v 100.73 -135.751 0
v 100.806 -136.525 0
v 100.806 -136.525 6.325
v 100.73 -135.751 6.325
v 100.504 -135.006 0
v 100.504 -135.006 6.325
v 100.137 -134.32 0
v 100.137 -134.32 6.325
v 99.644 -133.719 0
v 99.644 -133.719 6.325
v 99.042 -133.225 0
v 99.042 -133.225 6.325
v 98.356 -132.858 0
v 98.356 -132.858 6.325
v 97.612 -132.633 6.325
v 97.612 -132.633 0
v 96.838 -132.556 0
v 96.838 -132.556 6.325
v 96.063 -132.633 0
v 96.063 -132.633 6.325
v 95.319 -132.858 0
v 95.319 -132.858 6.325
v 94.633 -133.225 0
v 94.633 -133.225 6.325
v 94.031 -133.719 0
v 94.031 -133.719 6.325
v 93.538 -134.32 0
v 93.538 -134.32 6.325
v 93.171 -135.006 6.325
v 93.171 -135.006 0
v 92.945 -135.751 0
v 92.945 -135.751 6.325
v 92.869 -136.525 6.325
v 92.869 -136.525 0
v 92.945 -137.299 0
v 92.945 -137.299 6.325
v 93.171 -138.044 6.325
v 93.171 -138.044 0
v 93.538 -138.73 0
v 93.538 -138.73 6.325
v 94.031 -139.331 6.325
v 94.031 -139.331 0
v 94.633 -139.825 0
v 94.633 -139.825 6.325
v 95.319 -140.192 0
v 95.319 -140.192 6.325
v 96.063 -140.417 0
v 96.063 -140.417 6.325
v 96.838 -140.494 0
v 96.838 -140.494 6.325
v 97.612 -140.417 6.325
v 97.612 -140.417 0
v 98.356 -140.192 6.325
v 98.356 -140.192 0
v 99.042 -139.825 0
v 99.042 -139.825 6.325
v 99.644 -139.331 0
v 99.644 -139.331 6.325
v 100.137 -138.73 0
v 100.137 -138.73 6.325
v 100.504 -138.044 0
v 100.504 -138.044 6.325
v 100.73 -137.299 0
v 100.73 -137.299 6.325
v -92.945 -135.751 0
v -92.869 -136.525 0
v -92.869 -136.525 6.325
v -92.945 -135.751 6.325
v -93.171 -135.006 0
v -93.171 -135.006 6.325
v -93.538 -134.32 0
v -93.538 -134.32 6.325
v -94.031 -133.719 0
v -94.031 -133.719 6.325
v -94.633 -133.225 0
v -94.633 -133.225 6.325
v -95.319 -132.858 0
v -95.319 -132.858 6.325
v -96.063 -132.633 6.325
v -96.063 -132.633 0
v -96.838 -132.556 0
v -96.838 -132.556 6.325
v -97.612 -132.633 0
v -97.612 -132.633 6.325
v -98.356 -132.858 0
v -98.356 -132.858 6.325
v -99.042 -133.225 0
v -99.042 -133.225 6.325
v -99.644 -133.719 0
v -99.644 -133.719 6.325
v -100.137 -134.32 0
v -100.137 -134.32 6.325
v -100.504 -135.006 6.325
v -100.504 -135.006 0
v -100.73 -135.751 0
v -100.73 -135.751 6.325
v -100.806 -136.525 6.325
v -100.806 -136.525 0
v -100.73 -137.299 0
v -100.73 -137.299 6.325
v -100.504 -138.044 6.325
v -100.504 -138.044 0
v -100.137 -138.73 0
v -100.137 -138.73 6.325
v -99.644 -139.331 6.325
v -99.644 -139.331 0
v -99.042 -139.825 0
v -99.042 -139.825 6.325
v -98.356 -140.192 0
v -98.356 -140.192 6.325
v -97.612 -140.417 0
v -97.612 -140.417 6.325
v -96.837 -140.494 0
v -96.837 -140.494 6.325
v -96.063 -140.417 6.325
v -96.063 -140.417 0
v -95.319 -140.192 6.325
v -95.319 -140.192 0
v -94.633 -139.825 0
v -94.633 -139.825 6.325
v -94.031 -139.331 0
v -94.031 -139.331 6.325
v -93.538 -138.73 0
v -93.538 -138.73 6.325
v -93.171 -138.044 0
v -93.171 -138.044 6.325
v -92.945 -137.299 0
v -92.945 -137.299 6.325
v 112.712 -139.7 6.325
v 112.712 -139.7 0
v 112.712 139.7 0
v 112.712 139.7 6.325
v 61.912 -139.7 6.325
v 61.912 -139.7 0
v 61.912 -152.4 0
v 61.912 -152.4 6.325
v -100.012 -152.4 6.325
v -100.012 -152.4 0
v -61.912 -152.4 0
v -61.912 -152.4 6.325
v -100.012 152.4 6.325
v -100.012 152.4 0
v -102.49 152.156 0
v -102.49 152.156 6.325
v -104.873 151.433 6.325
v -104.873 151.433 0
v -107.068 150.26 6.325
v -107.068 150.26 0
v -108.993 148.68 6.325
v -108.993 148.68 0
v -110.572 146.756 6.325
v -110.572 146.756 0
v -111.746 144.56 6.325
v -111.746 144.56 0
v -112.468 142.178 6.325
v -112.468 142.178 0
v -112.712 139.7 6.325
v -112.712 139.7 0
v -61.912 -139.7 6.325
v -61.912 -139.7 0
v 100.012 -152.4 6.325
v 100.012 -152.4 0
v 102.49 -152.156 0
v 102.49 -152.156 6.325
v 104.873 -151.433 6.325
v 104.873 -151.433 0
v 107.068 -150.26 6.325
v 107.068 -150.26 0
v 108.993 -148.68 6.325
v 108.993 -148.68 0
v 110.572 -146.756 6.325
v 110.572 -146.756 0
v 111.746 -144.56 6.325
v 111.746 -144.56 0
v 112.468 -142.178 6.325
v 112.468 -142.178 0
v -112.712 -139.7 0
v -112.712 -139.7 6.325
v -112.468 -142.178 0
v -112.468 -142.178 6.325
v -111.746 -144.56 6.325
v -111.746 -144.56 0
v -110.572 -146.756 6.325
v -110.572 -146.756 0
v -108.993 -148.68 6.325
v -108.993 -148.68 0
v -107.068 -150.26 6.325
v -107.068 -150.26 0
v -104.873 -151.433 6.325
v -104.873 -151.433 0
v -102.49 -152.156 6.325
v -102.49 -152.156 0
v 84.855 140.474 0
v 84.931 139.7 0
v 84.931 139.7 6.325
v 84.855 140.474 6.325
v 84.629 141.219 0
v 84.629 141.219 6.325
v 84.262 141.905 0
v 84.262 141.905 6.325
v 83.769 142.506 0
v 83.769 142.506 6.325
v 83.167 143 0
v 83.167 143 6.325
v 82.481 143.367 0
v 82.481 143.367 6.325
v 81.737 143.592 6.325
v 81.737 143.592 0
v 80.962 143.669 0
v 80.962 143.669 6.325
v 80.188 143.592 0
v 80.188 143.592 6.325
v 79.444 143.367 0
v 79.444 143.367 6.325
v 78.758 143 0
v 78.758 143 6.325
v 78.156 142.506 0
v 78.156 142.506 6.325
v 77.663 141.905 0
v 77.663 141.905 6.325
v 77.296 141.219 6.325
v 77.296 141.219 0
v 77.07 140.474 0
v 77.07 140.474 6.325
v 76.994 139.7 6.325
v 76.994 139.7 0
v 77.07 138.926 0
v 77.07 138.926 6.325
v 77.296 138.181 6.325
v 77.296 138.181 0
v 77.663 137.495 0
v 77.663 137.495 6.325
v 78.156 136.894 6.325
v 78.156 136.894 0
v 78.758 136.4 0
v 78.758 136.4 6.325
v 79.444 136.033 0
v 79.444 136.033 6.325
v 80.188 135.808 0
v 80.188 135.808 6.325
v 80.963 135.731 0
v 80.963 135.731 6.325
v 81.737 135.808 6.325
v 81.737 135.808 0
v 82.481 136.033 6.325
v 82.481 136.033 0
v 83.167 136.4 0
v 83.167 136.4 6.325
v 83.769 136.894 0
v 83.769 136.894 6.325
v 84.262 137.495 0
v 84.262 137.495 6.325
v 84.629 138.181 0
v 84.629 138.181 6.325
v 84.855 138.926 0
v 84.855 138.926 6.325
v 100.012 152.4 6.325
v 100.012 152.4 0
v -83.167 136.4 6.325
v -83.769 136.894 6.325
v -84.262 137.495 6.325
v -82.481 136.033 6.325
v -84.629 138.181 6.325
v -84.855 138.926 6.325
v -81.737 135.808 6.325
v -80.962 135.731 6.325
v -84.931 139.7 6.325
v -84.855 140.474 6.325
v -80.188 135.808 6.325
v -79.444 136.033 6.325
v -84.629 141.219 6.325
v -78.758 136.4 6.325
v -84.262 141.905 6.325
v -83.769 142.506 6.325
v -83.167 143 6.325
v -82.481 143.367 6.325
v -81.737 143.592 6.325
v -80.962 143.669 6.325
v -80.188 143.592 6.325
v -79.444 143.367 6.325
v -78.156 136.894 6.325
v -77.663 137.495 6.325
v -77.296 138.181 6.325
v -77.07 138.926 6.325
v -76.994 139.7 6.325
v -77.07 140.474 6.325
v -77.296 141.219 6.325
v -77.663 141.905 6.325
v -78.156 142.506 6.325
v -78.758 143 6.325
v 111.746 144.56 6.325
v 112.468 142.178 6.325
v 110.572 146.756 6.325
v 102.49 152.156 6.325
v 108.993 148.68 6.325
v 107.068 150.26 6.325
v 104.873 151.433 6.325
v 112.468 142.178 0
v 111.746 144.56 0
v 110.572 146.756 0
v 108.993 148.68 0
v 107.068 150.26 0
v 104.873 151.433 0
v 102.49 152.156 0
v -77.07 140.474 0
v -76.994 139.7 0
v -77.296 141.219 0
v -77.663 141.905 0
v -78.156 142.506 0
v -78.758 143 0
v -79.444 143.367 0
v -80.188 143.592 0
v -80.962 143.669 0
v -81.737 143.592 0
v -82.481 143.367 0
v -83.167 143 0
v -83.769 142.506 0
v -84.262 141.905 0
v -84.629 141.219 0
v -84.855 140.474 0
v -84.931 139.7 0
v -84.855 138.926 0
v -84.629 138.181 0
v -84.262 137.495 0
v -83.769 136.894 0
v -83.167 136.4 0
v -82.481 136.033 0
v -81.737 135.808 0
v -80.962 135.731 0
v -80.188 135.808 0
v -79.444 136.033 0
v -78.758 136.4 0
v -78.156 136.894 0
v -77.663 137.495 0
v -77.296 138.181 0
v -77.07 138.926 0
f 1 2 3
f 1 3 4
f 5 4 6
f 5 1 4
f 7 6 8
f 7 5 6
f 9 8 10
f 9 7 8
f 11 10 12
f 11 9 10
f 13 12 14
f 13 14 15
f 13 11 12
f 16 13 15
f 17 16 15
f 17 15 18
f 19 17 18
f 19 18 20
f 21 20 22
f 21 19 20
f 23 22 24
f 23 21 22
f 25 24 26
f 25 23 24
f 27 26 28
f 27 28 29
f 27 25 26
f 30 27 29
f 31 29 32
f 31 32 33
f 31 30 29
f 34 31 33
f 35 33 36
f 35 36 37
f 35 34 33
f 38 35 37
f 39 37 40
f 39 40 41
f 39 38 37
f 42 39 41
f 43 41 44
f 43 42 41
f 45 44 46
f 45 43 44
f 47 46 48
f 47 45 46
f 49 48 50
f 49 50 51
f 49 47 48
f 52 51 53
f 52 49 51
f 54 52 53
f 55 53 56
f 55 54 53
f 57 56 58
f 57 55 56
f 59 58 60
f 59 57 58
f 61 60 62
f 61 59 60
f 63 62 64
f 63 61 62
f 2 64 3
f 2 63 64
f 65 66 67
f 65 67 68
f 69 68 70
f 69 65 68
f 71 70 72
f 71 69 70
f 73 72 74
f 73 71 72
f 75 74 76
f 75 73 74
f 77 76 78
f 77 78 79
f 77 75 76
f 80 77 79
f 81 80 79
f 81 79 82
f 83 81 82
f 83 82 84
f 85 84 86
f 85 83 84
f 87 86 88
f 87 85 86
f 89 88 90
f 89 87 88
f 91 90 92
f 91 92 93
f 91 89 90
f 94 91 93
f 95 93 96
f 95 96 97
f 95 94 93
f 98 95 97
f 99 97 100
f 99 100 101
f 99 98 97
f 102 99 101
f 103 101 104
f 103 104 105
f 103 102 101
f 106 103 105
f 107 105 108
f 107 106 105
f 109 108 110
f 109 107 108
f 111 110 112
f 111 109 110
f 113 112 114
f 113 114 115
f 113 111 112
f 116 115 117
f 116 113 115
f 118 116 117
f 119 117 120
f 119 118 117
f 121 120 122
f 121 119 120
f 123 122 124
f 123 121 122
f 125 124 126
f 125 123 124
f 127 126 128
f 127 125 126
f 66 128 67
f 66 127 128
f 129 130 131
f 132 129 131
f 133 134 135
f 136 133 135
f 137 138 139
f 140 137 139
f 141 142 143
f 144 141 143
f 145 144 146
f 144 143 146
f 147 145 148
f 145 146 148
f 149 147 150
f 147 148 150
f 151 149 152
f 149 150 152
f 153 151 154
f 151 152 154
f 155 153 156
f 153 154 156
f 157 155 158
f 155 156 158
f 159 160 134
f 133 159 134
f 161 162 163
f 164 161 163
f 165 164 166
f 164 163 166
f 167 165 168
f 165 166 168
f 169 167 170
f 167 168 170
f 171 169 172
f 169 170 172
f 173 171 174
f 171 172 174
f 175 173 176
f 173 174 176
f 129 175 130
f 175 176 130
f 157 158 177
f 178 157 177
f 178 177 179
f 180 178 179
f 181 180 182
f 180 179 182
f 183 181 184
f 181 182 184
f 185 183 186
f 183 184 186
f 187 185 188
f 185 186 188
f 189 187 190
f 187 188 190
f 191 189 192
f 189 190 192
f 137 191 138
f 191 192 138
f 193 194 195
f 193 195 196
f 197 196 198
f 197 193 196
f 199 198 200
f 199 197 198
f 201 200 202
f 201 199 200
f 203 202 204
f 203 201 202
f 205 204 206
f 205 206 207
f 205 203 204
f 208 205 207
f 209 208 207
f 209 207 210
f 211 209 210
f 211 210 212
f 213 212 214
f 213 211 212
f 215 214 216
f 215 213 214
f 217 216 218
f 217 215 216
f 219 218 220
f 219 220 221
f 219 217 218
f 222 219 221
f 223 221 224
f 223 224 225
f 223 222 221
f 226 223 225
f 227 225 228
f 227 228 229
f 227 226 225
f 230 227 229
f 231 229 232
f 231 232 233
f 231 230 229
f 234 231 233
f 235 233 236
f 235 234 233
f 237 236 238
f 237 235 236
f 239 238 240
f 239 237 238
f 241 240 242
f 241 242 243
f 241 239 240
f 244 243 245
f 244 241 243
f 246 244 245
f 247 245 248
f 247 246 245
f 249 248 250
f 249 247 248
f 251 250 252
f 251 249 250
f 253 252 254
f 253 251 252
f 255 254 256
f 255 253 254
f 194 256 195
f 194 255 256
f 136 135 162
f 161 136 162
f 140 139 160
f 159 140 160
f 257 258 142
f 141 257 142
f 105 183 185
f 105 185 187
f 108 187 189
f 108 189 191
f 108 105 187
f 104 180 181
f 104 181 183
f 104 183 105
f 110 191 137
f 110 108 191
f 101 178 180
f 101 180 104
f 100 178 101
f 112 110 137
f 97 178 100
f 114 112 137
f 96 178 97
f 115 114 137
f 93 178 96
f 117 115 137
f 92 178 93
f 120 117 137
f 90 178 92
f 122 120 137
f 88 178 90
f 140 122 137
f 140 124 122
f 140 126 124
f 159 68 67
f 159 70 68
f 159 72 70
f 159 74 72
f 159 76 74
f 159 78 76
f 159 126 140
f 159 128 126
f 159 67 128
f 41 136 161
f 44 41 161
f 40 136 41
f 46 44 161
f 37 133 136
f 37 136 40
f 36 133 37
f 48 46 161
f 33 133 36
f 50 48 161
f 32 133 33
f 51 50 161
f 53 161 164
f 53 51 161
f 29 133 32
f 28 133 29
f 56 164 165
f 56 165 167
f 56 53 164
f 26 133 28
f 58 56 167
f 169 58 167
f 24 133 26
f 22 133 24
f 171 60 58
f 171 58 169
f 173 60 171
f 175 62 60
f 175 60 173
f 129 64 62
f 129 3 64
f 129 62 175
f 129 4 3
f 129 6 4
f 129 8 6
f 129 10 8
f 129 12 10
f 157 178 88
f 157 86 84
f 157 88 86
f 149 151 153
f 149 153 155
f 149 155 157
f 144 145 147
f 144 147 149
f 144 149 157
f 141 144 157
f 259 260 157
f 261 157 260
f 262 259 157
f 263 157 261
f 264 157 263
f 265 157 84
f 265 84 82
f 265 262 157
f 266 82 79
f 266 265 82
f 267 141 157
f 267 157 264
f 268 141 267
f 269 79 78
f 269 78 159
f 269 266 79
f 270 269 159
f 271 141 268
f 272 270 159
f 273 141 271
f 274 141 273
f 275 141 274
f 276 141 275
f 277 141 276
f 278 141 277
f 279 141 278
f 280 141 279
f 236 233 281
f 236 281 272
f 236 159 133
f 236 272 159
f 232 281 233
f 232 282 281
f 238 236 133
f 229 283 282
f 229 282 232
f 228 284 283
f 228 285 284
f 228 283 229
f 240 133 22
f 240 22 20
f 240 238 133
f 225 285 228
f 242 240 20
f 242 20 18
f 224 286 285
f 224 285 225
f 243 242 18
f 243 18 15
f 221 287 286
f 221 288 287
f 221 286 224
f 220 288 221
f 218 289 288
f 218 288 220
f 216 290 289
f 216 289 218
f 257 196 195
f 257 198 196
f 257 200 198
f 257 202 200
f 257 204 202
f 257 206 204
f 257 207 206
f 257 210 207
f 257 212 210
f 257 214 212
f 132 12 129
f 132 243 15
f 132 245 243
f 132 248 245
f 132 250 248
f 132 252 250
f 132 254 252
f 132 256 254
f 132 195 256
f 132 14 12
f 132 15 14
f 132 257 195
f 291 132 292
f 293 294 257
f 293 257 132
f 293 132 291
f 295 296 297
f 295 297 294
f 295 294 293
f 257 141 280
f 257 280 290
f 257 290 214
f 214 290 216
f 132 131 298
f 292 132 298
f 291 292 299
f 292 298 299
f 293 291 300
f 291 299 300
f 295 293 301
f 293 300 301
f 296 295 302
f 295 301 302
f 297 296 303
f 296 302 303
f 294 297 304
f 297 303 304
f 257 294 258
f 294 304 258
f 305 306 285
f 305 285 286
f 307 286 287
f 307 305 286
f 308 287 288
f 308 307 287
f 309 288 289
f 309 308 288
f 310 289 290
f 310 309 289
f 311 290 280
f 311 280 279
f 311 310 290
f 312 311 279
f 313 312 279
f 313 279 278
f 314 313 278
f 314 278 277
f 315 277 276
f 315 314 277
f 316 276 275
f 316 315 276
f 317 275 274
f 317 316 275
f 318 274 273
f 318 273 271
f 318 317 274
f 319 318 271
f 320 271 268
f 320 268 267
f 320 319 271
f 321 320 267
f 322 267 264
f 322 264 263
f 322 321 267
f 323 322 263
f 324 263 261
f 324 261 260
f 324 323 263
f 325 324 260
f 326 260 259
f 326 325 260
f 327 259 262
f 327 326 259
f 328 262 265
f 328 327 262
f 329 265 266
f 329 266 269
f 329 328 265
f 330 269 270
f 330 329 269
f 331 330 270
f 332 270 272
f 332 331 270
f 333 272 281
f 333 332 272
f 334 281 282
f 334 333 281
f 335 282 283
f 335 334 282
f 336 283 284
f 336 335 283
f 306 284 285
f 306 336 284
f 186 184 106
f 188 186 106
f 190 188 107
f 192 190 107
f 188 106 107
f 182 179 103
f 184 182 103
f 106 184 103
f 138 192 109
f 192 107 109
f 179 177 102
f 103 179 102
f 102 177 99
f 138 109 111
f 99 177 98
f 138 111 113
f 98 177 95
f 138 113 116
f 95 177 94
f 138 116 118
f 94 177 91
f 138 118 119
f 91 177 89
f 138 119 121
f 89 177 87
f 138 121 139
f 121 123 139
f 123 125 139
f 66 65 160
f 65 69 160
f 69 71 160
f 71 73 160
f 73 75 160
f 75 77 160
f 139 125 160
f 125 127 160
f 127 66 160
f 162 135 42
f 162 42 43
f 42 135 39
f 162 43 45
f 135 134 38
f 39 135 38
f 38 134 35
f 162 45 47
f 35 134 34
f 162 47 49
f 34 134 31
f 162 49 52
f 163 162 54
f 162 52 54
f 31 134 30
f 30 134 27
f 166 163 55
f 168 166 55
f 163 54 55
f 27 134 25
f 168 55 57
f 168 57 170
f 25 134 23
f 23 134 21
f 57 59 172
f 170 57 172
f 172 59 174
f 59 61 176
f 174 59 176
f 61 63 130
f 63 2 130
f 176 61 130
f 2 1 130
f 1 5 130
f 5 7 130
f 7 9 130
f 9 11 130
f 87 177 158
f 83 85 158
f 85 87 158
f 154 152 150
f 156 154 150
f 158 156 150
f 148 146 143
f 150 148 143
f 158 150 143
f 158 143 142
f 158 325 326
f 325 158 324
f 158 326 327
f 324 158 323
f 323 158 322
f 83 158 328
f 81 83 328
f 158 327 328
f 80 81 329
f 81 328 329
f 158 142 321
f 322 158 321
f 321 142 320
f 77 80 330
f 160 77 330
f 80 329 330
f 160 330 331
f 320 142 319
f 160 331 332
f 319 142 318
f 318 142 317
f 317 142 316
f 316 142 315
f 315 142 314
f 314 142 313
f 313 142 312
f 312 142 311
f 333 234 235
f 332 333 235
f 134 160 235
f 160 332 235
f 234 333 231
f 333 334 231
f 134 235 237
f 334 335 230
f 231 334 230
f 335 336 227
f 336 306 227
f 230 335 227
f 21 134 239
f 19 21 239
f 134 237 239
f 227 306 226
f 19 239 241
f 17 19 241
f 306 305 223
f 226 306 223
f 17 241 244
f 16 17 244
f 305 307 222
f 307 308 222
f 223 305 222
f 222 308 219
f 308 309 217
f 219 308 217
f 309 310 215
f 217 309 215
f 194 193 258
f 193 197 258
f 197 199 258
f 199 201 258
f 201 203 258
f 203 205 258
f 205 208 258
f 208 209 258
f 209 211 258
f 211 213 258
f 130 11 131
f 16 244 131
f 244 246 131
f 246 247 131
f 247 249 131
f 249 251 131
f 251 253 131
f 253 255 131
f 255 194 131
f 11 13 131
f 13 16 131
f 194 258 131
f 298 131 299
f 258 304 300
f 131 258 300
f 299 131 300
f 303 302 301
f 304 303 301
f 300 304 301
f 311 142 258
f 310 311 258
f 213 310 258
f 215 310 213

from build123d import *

# Parameters (mm, degrees)
F0_R     = 3.96875
F1_DEPTH = 6.3246


with BuildPart() as f1:
    # F0 (on Top) → F1 (new body)
    with BuildSketch(Plane.XY):
        with BuildLine():
            Line((61.9125, -152.4), (100.0125, -152.4))
            ThreePointArc((100.0125, -152.4), (108.992756, -148.680256), (112.7125, -139.7))
            Line((112.7125, -139.7), (112.7125, 139.7))
            ThreePointArc((112.7125, 139.7), (108.992756, 148.680256), (100.0125, 152.4))
            Line((100.0125, 152.4), (-100.0125, 152.4))
            ThreePointArc((-100.0125, 152.4), (-108.992756, 148.680256), (-112.7125, 139.7))
            Line((-112.7125, 139.7), (-112.7125, -139.7))
            ThreePointArc((-112.7125, -139.7), (-108.992756, -148.680256), (-100.0125, -152.4))
            Line((-100.0125, -152.4), (-61.9125, -152.4))
            Line((-61.9125, -152.4), (-61.9125, -139.7))
            Line((-61.9125, -139.7), (61.9125, -139.7))
            Line((61.9125, -139.7), (61.9125, -152.4))
        make_face()
        with Locations((-96.8375, -136.525)):
            Circle(F0_R, mode=Mode.SUBTRACT)
        with Locations((96.8375, -136.525)):
            Circle(F0_R, mode=Mode.SUBTRACT)
        with Locations((-80.9625, 139.7)):
            Circle(F0_R, mode=Mode.SUBTRACT)
        with Locations((80.9625, 139.7)):
            Circle(F0_R, mode=Mode.SUBTRACT)
    extrude(amount=F1_DEPTH)


solid = f1.part
